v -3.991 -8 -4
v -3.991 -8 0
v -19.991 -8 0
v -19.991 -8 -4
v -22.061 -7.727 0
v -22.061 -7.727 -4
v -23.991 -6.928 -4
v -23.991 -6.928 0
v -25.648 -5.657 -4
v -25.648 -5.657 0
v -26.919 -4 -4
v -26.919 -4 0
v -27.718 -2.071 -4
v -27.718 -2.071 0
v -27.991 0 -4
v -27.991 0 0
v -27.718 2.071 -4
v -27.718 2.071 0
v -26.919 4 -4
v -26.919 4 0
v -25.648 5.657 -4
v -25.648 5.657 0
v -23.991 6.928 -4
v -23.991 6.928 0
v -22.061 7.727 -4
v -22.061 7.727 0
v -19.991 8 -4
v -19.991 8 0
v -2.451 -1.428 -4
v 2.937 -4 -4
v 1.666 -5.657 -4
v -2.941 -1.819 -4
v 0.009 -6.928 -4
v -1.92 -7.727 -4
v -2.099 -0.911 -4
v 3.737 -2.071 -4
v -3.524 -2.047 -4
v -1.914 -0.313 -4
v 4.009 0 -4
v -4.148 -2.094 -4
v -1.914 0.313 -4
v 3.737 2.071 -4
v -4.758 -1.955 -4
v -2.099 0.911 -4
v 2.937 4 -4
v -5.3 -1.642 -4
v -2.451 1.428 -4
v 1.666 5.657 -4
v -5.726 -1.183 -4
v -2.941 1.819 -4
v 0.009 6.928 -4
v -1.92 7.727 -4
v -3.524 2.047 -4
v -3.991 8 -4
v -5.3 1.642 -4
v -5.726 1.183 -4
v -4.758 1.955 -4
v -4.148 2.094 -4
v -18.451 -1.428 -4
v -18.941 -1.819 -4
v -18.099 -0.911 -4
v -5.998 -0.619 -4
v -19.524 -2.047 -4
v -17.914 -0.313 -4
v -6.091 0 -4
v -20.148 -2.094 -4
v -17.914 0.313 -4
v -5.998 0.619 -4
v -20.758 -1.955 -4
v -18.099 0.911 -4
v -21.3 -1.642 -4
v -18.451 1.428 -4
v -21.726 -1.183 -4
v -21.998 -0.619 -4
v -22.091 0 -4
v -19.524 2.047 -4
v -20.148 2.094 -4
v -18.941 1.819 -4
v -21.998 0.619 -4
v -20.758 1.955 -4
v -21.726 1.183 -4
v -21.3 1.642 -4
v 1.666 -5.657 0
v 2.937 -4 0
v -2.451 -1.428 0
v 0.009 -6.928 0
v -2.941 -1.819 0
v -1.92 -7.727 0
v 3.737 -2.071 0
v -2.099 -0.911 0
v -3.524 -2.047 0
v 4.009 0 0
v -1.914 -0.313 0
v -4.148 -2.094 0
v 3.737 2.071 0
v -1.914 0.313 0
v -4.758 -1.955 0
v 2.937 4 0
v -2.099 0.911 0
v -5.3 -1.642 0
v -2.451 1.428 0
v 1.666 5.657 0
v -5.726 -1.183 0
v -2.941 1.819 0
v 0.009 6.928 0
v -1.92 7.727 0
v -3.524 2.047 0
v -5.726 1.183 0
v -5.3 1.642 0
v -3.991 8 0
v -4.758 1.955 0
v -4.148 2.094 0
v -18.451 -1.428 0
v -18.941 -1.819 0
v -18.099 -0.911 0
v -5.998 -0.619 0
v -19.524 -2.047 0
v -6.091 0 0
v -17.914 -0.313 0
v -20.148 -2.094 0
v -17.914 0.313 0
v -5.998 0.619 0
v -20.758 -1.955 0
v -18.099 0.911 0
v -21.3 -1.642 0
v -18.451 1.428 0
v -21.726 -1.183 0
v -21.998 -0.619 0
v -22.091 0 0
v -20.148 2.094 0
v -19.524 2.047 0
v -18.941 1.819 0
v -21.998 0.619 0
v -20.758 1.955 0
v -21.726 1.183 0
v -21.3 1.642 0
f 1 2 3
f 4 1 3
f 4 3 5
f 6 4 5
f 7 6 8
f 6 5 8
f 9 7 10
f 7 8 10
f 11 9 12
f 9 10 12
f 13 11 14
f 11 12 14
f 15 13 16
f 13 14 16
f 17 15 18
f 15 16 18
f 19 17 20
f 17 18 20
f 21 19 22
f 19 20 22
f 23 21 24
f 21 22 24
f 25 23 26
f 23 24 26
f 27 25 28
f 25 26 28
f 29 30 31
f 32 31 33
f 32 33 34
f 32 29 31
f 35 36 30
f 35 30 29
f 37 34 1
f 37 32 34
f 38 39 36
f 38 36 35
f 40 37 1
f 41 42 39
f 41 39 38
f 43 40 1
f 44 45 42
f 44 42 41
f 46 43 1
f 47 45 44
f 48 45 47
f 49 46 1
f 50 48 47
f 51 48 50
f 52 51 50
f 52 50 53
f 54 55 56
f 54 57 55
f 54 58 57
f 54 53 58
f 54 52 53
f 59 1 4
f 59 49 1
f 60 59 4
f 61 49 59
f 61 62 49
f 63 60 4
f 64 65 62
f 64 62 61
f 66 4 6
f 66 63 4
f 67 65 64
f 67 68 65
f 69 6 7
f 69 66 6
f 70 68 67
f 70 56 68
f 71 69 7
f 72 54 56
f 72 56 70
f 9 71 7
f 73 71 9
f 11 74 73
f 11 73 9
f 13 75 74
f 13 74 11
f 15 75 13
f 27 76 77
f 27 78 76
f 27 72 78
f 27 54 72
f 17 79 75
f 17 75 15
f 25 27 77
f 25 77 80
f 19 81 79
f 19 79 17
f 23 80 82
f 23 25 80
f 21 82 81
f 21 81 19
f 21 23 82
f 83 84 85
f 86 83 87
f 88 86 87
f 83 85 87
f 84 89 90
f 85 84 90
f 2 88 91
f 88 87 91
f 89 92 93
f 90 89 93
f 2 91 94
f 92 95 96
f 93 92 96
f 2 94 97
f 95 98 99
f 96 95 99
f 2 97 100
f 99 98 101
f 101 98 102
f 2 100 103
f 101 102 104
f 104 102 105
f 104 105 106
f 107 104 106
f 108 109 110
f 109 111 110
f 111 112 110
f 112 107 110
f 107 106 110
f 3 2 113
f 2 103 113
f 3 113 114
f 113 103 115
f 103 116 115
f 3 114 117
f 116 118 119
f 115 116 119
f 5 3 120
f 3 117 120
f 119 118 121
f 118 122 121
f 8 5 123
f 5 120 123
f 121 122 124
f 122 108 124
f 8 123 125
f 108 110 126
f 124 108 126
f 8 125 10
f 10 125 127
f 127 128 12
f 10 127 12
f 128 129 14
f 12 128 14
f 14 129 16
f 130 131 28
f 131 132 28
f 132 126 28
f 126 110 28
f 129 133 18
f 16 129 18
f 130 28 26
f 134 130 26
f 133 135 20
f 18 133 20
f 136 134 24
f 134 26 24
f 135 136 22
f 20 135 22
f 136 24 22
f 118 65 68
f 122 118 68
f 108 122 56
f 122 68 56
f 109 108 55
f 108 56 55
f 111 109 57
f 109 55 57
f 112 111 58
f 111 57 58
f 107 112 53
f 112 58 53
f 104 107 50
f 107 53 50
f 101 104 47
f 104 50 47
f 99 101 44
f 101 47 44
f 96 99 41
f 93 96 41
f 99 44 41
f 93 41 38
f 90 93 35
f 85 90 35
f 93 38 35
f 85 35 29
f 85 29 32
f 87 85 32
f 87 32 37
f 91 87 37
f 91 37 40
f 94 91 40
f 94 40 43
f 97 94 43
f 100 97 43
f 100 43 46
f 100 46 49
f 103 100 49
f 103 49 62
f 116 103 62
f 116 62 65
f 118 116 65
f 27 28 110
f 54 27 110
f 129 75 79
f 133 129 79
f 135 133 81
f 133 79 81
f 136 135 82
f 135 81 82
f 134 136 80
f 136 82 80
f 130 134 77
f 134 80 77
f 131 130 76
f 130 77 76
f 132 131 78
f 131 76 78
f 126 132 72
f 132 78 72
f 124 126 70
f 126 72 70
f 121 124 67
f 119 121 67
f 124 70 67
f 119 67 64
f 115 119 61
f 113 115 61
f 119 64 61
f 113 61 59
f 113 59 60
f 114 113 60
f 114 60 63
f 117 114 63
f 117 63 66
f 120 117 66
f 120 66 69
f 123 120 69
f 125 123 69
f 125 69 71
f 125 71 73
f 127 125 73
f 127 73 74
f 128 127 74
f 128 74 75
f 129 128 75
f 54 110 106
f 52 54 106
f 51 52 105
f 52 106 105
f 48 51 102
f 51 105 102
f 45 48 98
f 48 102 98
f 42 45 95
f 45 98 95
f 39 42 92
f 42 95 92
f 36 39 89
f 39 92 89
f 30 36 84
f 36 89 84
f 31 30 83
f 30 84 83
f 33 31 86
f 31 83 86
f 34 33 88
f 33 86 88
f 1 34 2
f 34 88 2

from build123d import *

# Parameters (mm, degrees)
BRIDA_BASE1_DEPTH         = 4
TALADRO_ROSCADO_M51_D     = 4.2
TALADRO_ROSCADO_M51_DEPTH = 14
TALADRO_ROSCADO_M51_TIP   = 1.2618073


# Sheet-metal steps are written as plain solids
with BuildPart() as part:
    # Croquis1 → Brida base1 (new body)
    with BuildSketch(Plane.XY):
        with BuildLine():
            Line((-19.990811444, 8), (-3.990811444, 8))
            ThreePointArc((-3.990811444, 8), (4.009188556, 0), (-3.990811444, -8))
            Line((-3.990811444, -8), (-19.990811444, -8))
            ThreePointArc((-19.990811444, -8), (-27.990811444, 0), (-19.990811444, 8))
        make_face()
    extrude(amount=-BRIDA_BASE1_DEPTH)

    # Taladro roscado M51
    with Locations(Plane.XY):
        with Locations((-19.990811444, 0), (-3.990811444, 0)):
            Hole(TALADRO_ROSCADO_M51_D / 2, depth=TALADRO_ROSCADO_M51_DEPTH)
            with Locations((0, 0, -(TALADRO_ROSCADO_M51_DEPTH + TALADRO_ROSCADO_M51_TIP / 2))):  # 118° drill point
                Cone(0, TALADRO_ROSCADO_M51_D / 2, TALADRO_ROSCADO_M51_TIP, mode=Mode.SUBTRACT)


solid = part.part
